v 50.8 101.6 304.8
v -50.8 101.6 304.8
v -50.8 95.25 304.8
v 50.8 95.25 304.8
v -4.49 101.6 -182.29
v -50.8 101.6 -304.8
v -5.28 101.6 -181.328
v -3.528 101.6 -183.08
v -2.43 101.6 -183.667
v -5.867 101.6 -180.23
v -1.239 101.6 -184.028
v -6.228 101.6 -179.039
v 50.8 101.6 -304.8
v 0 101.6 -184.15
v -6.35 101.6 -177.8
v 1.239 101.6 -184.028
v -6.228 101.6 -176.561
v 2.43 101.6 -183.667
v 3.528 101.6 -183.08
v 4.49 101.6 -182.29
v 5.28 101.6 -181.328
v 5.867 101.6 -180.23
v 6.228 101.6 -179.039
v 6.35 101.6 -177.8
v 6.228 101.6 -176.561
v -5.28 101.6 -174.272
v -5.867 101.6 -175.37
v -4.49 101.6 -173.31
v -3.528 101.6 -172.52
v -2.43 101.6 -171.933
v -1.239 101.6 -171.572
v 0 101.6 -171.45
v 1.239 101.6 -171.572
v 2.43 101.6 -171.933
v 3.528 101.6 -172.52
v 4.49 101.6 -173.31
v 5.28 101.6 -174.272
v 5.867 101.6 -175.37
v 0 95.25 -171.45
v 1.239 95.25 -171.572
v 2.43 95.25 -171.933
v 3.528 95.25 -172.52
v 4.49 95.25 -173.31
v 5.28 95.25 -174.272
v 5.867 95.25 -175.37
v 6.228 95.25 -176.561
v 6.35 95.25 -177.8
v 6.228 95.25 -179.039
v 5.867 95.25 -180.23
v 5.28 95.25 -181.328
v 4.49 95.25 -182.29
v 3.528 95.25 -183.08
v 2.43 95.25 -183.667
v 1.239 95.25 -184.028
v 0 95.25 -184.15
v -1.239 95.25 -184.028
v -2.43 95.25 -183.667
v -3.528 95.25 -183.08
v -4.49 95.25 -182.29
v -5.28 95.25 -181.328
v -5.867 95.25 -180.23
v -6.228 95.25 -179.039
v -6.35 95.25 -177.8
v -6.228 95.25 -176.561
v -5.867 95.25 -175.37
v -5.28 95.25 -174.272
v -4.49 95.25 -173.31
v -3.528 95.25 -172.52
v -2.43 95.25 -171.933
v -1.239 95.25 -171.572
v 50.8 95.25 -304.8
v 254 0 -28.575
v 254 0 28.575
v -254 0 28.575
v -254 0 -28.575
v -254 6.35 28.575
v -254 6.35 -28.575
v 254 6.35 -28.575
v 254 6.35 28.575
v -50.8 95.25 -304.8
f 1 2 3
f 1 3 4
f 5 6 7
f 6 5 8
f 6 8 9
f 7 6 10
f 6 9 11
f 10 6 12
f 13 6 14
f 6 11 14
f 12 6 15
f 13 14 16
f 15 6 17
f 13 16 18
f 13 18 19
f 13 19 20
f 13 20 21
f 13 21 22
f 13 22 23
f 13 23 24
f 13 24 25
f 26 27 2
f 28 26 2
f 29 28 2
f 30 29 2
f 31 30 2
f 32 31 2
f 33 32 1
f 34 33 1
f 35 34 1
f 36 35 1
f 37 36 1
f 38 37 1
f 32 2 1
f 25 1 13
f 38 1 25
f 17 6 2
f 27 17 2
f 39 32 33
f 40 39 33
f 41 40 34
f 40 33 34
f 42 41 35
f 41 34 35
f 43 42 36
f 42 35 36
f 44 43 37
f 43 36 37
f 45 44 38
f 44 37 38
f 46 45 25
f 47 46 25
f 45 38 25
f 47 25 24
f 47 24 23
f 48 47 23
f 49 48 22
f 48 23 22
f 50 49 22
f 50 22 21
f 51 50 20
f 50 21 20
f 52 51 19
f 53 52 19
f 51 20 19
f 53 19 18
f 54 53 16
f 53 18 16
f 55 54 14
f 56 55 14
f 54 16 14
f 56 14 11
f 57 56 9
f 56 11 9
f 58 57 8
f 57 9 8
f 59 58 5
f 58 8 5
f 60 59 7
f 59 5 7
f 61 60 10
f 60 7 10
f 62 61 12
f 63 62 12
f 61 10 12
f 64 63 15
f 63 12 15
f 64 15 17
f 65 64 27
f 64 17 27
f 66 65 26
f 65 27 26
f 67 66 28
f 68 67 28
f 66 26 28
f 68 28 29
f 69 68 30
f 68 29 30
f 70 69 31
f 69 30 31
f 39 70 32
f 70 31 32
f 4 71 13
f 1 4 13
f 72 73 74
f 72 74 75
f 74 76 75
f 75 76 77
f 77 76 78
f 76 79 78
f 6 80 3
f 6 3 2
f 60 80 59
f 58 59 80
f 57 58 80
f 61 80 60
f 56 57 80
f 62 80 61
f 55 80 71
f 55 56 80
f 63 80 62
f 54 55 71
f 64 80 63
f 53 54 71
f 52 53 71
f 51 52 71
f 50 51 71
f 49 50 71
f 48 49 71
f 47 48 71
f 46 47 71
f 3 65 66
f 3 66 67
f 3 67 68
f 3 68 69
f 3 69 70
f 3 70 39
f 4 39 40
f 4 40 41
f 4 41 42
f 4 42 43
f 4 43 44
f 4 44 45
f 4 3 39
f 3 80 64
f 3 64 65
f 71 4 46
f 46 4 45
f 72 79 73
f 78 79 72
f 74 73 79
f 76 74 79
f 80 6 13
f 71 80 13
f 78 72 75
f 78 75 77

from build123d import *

# Parameters (mm, degrees)
SKETCH1_W           = 57.15
SKETCH1_H           = 6.35
BOSS_EXTRUDE1_DEPTH = 254
SKETCH2_W           = 101.6
SKETCH2_H           = 6.35
BOSS_EXTRUDE2_DEPTH = 304.8
SKETCH3_R           = 6.35
CUT_EXTRUDE1_DEPTH  = 6.35


with BuildPart() as part:
    # Sketch1 → Boss-Extrude1 (new, symmetric)
    with BuildSketch(Plane(origin=(0, 0, 0), x_dir=(0, 0, -1), z_dir=(1, 0, 0))):
        with Locations((0, 3.175)):
            Rectangle(SKETCH1_W, SKETCH1_H)
    extrude(amount=BOSS_EXTRUDE1_DEPTH, both=True)


with BuildPart() as body_2:
    # Sketch2 → Boss-Extrude2 (new, symmetric)
    with BuildSketch(Plane.XY):
        with Locations((0, 98.425)):
            Rectangle(SKETCH2_W, SKETCH2_H)
    extrude(amount=BOSS_EXTRUDE2_DEPTH, both=True)

    # Sketch3 → Cut-Extrude1 (cut)
    with BuildSketch(Plane(origin=(0, 101.6, 0), x_dir=(1, 0, 0), z_dir=(0, 1, 0))):
        with Locations(Location((0, 177.8, 0), (0, 0, 270))):
            Circle(SKETCH3_R)
    extrude(amount=-CUT_EXTRUDE1_DEPTH, mode=Mode.SUBTRACT)


solid = Compound([part.part, body_2.part])
